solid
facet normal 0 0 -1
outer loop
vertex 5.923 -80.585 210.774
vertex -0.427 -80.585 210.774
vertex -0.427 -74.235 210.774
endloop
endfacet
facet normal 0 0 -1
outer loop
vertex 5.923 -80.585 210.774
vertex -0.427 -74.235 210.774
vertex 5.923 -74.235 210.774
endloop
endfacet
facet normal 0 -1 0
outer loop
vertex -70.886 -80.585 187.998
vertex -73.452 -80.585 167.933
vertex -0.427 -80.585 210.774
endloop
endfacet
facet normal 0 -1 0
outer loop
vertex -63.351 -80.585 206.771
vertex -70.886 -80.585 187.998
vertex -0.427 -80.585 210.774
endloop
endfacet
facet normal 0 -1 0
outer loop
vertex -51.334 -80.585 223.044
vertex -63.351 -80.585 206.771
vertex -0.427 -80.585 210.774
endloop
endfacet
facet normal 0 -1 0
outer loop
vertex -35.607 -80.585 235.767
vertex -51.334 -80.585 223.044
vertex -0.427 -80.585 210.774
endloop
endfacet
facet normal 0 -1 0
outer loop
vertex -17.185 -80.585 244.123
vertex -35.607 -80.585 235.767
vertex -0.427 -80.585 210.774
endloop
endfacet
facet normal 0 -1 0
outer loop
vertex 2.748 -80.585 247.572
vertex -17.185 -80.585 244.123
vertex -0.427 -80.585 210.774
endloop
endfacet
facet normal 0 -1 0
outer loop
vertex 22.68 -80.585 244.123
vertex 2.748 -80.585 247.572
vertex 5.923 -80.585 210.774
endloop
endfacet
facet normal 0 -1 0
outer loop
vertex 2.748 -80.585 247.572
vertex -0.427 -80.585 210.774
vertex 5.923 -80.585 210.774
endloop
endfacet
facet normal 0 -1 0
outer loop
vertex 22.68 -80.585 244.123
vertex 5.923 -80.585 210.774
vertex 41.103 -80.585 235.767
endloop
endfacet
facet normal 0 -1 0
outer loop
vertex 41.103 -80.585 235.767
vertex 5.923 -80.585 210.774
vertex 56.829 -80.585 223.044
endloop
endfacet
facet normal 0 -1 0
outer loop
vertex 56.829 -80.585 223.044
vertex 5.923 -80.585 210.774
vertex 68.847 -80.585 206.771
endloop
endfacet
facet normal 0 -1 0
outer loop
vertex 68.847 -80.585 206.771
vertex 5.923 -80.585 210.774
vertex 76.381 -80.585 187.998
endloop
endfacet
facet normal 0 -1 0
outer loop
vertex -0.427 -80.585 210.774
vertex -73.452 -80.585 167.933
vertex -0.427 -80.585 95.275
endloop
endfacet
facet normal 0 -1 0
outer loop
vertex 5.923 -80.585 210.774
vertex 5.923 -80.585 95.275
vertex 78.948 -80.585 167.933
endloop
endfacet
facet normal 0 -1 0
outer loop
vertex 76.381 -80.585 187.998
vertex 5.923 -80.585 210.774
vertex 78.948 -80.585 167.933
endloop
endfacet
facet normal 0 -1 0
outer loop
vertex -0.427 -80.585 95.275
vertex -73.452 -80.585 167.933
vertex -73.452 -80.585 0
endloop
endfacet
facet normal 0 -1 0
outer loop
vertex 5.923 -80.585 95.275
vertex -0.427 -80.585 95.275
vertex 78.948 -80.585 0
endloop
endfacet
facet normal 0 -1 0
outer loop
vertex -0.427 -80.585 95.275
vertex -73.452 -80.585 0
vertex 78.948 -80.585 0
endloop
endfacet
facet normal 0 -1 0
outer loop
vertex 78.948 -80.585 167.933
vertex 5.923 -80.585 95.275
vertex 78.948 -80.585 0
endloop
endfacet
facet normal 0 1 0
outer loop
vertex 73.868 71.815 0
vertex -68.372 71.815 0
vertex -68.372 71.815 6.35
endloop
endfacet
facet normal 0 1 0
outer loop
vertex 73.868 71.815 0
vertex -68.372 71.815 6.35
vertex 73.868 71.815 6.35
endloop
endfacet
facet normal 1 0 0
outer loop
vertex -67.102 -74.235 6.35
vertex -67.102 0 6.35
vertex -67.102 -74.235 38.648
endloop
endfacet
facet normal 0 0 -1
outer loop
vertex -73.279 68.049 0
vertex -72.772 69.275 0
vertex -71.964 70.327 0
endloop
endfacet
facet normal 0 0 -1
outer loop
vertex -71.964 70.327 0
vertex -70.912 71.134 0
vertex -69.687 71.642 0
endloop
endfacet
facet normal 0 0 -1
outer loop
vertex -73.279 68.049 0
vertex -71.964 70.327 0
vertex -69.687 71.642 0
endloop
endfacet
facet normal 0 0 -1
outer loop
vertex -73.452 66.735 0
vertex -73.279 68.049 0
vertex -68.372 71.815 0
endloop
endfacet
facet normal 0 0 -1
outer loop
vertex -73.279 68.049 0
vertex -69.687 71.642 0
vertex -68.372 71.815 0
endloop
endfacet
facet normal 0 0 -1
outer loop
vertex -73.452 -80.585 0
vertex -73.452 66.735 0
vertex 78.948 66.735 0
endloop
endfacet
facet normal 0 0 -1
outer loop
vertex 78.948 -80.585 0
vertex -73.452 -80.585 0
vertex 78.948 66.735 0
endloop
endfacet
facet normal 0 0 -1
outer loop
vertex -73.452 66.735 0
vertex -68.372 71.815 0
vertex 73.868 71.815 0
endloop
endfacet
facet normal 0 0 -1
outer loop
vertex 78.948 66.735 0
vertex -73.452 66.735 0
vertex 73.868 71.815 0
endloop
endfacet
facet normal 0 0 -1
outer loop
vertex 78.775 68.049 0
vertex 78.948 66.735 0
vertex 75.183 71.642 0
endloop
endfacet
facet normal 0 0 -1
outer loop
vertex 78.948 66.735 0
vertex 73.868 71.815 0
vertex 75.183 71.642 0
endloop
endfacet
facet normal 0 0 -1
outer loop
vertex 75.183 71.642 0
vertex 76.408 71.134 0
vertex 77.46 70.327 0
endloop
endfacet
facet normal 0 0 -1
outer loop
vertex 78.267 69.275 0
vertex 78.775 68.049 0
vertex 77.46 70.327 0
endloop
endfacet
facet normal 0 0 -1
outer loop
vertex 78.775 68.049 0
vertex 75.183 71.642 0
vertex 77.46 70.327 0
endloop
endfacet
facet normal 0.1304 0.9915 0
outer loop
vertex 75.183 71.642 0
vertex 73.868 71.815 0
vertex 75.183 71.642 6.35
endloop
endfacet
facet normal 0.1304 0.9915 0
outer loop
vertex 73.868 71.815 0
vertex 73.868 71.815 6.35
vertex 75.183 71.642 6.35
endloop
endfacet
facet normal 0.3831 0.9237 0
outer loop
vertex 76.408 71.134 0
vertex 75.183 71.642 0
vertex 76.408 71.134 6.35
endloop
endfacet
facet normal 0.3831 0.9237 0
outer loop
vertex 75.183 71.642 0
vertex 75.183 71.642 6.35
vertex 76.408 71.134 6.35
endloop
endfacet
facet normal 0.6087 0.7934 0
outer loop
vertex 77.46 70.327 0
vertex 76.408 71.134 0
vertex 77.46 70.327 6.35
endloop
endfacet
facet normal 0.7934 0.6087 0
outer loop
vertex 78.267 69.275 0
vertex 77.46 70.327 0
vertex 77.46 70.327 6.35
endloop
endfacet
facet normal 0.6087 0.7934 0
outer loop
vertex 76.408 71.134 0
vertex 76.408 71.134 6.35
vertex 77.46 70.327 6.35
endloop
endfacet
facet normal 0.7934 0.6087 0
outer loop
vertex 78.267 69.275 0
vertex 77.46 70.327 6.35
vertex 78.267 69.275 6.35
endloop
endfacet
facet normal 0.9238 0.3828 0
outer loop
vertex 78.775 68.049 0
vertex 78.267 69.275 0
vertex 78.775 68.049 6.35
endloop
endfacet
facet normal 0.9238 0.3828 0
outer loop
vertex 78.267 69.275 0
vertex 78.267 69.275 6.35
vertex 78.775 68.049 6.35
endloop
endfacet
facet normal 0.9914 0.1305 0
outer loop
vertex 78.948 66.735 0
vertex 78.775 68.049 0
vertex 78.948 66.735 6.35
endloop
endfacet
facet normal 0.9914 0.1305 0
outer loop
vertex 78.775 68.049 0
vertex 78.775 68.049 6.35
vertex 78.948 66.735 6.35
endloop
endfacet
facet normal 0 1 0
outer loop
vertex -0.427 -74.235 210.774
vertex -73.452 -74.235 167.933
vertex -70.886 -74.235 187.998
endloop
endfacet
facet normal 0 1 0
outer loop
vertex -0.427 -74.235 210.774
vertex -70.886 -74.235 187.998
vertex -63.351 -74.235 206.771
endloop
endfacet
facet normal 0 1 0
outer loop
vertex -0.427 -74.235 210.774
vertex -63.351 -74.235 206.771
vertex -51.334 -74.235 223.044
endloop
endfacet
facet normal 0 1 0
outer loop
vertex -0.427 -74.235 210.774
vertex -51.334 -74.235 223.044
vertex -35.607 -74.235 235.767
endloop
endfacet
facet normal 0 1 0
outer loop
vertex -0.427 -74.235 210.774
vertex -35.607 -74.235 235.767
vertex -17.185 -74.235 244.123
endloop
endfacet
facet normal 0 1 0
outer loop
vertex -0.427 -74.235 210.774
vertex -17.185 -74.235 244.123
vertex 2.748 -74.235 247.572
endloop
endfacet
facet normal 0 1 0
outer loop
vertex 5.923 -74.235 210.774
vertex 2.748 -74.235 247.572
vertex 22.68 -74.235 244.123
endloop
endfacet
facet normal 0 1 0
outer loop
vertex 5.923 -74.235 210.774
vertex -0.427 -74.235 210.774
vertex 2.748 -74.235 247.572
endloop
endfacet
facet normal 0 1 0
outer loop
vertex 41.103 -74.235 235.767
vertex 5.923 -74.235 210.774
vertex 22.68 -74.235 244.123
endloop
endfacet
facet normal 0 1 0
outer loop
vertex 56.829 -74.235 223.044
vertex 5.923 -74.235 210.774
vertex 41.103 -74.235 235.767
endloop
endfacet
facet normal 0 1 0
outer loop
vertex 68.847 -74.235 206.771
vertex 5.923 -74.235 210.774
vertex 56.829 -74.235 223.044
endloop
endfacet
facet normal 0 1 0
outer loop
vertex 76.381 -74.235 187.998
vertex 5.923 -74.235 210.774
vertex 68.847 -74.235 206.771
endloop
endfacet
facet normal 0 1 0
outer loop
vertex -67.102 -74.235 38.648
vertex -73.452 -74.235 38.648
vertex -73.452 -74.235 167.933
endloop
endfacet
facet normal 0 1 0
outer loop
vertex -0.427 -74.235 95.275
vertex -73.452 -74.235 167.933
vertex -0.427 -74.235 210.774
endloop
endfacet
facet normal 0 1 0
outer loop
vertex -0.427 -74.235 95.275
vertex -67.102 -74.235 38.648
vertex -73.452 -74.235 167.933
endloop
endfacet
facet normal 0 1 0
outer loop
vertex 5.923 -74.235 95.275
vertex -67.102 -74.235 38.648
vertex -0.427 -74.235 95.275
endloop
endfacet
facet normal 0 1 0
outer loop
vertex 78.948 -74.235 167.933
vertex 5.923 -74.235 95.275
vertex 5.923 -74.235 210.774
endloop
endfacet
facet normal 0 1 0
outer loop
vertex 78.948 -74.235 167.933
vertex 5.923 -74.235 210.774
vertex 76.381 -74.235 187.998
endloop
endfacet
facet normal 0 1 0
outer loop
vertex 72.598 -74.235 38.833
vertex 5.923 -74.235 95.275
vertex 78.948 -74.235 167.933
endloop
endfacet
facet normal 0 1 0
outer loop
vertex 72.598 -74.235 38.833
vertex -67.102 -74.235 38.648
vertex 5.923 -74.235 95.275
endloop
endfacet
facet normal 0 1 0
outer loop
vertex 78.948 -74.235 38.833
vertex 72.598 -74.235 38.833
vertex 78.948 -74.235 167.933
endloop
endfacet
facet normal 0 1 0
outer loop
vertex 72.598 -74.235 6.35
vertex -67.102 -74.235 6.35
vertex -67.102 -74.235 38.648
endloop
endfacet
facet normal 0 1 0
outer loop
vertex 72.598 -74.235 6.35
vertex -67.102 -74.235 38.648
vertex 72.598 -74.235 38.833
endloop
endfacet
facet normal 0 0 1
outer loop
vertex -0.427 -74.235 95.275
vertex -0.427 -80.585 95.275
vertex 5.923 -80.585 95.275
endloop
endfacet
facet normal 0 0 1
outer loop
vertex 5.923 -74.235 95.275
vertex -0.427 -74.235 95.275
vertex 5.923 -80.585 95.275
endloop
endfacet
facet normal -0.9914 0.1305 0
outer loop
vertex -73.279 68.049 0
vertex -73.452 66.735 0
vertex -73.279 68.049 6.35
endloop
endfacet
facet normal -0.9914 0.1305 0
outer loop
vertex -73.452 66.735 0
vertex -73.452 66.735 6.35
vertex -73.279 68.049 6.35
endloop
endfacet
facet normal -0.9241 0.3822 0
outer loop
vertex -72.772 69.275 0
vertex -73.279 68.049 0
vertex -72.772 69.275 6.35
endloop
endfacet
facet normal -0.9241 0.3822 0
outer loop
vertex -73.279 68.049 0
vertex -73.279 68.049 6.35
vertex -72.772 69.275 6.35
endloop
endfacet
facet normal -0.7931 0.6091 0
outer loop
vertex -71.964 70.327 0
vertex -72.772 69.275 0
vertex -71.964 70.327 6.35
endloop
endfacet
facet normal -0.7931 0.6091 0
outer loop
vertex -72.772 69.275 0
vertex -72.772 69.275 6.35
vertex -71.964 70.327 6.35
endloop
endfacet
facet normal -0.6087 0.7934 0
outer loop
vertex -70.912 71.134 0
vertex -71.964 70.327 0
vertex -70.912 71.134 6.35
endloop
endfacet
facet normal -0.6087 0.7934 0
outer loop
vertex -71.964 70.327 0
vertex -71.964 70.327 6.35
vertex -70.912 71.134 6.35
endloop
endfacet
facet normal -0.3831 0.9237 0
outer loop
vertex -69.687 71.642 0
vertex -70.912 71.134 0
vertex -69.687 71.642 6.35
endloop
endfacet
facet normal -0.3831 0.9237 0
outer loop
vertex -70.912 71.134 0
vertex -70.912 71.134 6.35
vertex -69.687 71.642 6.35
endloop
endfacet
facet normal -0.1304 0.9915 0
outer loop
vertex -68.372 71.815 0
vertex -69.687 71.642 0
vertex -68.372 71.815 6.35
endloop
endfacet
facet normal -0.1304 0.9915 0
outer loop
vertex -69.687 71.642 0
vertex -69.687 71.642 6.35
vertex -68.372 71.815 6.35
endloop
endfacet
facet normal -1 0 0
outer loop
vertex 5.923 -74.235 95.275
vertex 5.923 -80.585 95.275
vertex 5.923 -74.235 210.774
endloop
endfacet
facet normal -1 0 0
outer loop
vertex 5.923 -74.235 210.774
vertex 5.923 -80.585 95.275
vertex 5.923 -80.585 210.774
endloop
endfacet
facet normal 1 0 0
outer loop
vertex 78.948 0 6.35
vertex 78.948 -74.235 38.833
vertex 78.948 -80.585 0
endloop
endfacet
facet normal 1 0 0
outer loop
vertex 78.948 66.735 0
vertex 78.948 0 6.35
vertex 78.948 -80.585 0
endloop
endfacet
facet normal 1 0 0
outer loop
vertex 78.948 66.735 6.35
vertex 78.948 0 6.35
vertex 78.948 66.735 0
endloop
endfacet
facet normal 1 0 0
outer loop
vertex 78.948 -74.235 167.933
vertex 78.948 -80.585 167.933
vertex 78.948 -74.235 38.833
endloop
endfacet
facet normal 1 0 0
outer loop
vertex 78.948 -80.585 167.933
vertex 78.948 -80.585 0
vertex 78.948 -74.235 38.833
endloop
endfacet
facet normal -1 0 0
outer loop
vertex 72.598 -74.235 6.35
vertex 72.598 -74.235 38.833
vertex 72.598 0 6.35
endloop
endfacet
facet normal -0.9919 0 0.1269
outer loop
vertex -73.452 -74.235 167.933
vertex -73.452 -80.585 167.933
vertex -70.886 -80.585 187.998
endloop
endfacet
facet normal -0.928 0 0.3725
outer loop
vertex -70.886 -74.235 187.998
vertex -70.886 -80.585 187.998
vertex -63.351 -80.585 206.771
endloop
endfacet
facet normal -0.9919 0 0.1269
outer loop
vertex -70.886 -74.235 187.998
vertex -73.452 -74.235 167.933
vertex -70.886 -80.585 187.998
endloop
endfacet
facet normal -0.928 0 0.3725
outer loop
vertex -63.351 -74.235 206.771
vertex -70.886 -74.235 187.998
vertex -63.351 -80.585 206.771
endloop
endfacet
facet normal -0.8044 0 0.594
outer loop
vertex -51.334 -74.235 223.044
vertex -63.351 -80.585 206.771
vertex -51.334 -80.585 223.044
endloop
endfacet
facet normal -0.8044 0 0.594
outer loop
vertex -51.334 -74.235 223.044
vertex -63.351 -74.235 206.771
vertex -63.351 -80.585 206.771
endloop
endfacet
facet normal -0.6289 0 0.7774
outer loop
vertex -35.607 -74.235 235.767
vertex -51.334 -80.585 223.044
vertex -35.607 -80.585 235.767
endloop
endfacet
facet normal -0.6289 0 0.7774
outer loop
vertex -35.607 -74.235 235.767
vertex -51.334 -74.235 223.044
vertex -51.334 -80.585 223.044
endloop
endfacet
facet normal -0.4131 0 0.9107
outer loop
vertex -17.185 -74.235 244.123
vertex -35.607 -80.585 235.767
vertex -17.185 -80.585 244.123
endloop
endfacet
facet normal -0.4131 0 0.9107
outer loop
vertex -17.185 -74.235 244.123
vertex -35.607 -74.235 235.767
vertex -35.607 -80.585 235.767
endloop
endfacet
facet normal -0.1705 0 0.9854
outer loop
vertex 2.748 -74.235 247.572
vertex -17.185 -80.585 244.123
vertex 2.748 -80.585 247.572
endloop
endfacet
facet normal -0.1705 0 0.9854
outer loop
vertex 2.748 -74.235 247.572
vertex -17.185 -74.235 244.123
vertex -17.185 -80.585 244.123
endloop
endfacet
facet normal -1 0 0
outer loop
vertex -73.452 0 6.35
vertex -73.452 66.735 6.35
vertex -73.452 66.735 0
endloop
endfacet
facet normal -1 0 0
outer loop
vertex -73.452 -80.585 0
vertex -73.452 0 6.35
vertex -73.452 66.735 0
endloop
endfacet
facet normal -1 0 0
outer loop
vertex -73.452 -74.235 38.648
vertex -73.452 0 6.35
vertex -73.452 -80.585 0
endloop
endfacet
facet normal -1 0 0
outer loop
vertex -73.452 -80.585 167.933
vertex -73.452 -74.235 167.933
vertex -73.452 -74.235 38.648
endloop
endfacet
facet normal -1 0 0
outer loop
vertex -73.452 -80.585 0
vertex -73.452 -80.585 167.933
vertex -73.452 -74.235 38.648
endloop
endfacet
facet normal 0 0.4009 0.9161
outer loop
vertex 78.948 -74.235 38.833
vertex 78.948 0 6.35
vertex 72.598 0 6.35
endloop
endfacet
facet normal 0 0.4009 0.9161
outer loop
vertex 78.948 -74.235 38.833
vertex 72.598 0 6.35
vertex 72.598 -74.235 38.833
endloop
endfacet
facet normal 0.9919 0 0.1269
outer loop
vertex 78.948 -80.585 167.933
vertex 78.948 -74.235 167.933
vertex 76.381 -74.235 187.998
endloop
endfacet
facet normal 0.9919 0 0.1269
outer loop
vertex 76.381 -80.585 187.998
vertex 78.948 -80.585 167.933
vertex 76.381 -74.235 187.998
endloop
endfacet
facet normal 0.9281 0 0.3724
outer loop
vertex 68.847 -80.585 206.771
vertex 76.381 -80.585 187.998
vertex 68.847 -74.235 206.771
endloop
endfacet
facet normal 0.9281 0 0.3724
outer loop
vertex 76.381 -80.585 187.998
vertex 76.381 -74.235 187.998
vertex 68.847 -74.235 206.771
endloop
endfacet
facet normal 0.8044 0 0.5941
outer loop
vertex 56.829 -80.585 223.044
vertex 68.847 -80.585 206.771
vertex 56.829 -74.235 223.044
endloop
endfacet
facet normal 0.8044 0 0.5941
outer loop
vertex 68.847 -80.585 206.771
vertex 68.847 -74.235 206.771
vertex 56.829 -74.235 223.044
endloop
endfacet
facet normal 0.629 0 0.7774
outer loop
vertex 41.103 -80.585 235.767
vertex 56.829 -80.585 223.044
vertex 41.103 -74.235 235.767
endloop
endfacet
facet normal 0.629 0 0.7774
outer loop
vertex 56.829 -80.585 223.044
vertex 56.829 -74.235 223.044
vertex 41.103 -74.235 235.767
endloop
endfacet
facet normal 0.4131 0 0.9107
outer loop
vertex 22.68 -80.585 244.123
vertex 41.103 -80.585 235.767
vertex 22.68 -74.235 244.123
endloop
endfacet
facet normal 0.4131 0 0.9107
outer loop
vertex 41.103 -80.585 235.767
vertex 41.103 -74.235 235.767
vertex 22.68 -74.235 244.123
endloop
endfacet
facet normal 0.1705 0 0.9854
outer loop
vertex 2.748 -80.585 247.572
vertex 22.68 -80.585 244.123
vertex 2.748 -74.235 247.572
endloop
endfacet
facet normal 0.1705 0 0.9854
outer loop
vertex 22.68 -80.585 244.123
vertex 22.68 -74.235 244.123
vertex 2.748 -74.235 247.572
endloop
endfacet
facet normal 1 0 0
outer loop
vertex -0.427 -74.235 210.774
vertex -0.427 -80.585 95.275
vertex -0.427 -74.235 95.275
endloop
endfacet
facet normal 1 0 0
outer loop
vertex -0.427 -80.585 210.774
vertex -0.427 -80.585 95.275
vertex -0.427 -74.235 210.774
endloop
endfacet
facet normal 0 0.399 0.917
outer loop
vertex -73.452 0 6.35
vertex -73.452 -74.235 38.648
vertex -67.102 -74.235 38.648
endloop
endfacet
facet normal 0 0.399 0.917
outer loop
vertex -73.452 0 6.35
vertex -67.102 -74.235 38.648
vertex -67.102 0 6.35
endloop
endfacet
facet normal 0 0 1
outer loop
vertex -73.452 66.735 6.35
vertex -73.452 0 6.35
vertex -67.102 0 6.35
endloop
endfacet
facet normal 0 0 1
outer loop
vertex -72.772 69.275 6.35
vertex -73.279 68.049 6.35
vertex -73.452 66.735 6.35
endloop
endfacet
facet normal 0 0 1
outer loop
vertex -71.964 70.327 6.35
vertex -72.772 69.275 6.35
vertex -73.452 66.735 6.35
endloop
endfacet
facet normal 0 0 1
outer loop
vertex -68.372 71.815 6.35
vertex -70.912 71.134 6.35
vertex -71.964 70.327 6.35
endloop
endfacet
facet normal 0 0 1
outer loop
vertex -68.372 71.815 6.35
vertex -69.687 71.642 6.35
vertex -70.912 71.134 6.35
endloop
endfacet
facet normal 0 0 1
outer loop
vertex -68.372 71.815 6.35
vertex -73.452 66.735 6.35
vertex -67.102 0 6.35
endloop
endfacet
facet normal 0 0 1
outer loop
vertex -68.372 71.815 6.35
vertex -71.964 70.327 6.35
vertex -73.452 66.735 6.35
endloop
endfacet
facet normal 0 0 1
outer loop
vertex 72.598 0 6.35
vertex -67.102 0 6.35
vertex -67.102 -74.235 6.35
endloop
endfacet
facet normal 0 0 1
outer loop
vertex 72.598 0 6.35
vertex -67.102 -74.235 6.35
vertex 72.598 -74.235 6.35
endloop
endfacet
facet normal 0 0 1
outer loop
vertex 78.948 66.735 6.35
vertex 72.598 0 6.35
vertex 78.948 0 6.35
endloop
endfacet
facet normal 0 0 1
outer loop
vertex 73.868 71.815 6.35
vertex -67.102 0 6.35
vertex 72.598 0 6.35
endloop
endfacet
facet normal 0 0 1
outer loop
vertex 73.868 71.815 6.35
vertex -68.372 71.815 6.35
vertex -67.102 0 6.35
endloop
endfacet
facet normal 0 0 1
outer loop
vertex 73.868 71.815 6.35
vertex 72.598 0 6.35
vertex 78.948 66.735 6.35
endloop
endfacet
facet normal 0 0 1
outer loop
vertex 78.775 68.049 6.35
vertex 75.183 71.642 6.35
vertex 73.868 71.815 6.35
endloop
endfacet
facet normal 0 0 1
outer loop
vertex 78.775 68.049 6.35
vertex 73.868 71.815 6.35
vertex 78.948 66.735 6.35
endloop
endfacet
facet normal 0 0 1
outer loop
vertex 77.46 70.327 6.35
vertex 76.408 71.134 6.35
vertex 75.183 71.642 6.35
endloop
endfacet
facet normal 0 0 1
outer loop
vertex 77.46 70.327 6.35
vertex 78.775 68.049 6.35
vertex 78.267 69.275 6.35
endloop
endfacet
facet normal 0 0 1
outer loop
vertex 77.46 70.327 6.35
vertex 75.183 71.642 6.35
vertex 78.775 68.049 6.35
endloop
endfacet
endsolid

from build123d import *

# Parameters (mm, degrees)
F0_W        = 152.4
F0_H        = 152.4
F1_DEPTH    = 6.35
F2_W        = 152.4
F2_H        = 6.35
F3_DEPTH    = 241.3
F5_T1_DEPTH = 404.9366591478
F6_W        = 6.35
F6_H        = 115.4995709658
F7_DEPTH    = 25.4
F8_R        = 5.08
F9_DEPTH    = 6.35
F11_DEPTH   = 6.35


# Not quite as in the source:
# - a fillet or chamfer that OpenCascade refuses, or shapes differently, is made with other operations: its cross-section is extruded or revolved along the edge and cut away or added


with BuildPart() as f1:
    # F0 (on Top) → F1 (new body)
    with BuildSketch(Plane.XY):
        with Locations((2.7477228088, -4.3853670359)):
            Rectangle(F0_W, F0_H)
    extrude(amount=F1_DEPTH)

    # F2 (on face) → F3 (join)
    with BuildSketch(Plane.XY.offset(6.35)):
        with Locations((2.7477228088, -77.4103670359)):
            Rectangle(F2_W, F2_H)
    extrude(amount=F3_DEPTH)

    # F5: fillet of radius 79.7173318296 on 2 edges, made by hand

    # F5_s2 → F5_t1 (cut)
    with BuildSketch(Plane.XZ.offset(-125.057962538)):
        with BuildLine():
            ThreePointArc((-73.4522771912, 167.9326681704), (-50.1036112765, 224.3013340852), (6.2650546383, 247.65))
            Line((6.2650546383, 247.65), (-73.4522771912, 247.65))
            Line((-73.4522771912, 247.65), (-73.4522771912, 167.9326681704))
        make_face()
        with BuildLine():
            ThreePointArc((78.9477228088, 167.9326681704), (55.599056894, 224.3013340852), (-0.7696090208, 247.65))
            Line((-0.7696090208, 247.65), (78.9477228088, 247.65))
            Line((78.9477228088, 247.65), (78.9477228088, 167.9326681704))
        make_face()
    extrude(amount=F5_T1_DEPTH, mode=Mode.SUBTRACT)

    # F6 (on face) → F7 (cut)
    with BuildSketch(Plane.XZ.offset(80.5853670359)):
        with Locations((2.7477228088, 153.0246064067)):
            Rectangle(F6_W, F6_H)
    extrude(amount=-F7_DEPTH, mode=Mode.SUBTRACT)

    # F8
    f8_edges = [f1.edges().sort_by_distance(p)[0] for p in [
        (78.947723, 71.814633, 3.175),
        (-73.452277, 71.814633, 3.175),
    ]]
    fillet(f8_edges, radius=F8_R)

    # F4 (on face) → F9 (join)
    with BuildSketch(Plane.YZ.offset(78.9477228088)):
        Polygon((-74.2353670359, 6.35), (0, 6.35), (-74.2353670359, 38.8328842819), align=None)
    extrude(amount=-F9_DEPTH)

    # F10 (on face) → F11 (join)
    with BuildSketch(Plane(origin=(-73.4522771912, 0, 0), x_dir=(0, -1, 0), z_dir=(-1, 0, 0))):
        Polygon((74.2353670359, 6.35), (74.2353670359, 38.6480651796), (0, 6.35), align=None)
    extrude(amount=-F11_DEPTH)


solid = f1.part
